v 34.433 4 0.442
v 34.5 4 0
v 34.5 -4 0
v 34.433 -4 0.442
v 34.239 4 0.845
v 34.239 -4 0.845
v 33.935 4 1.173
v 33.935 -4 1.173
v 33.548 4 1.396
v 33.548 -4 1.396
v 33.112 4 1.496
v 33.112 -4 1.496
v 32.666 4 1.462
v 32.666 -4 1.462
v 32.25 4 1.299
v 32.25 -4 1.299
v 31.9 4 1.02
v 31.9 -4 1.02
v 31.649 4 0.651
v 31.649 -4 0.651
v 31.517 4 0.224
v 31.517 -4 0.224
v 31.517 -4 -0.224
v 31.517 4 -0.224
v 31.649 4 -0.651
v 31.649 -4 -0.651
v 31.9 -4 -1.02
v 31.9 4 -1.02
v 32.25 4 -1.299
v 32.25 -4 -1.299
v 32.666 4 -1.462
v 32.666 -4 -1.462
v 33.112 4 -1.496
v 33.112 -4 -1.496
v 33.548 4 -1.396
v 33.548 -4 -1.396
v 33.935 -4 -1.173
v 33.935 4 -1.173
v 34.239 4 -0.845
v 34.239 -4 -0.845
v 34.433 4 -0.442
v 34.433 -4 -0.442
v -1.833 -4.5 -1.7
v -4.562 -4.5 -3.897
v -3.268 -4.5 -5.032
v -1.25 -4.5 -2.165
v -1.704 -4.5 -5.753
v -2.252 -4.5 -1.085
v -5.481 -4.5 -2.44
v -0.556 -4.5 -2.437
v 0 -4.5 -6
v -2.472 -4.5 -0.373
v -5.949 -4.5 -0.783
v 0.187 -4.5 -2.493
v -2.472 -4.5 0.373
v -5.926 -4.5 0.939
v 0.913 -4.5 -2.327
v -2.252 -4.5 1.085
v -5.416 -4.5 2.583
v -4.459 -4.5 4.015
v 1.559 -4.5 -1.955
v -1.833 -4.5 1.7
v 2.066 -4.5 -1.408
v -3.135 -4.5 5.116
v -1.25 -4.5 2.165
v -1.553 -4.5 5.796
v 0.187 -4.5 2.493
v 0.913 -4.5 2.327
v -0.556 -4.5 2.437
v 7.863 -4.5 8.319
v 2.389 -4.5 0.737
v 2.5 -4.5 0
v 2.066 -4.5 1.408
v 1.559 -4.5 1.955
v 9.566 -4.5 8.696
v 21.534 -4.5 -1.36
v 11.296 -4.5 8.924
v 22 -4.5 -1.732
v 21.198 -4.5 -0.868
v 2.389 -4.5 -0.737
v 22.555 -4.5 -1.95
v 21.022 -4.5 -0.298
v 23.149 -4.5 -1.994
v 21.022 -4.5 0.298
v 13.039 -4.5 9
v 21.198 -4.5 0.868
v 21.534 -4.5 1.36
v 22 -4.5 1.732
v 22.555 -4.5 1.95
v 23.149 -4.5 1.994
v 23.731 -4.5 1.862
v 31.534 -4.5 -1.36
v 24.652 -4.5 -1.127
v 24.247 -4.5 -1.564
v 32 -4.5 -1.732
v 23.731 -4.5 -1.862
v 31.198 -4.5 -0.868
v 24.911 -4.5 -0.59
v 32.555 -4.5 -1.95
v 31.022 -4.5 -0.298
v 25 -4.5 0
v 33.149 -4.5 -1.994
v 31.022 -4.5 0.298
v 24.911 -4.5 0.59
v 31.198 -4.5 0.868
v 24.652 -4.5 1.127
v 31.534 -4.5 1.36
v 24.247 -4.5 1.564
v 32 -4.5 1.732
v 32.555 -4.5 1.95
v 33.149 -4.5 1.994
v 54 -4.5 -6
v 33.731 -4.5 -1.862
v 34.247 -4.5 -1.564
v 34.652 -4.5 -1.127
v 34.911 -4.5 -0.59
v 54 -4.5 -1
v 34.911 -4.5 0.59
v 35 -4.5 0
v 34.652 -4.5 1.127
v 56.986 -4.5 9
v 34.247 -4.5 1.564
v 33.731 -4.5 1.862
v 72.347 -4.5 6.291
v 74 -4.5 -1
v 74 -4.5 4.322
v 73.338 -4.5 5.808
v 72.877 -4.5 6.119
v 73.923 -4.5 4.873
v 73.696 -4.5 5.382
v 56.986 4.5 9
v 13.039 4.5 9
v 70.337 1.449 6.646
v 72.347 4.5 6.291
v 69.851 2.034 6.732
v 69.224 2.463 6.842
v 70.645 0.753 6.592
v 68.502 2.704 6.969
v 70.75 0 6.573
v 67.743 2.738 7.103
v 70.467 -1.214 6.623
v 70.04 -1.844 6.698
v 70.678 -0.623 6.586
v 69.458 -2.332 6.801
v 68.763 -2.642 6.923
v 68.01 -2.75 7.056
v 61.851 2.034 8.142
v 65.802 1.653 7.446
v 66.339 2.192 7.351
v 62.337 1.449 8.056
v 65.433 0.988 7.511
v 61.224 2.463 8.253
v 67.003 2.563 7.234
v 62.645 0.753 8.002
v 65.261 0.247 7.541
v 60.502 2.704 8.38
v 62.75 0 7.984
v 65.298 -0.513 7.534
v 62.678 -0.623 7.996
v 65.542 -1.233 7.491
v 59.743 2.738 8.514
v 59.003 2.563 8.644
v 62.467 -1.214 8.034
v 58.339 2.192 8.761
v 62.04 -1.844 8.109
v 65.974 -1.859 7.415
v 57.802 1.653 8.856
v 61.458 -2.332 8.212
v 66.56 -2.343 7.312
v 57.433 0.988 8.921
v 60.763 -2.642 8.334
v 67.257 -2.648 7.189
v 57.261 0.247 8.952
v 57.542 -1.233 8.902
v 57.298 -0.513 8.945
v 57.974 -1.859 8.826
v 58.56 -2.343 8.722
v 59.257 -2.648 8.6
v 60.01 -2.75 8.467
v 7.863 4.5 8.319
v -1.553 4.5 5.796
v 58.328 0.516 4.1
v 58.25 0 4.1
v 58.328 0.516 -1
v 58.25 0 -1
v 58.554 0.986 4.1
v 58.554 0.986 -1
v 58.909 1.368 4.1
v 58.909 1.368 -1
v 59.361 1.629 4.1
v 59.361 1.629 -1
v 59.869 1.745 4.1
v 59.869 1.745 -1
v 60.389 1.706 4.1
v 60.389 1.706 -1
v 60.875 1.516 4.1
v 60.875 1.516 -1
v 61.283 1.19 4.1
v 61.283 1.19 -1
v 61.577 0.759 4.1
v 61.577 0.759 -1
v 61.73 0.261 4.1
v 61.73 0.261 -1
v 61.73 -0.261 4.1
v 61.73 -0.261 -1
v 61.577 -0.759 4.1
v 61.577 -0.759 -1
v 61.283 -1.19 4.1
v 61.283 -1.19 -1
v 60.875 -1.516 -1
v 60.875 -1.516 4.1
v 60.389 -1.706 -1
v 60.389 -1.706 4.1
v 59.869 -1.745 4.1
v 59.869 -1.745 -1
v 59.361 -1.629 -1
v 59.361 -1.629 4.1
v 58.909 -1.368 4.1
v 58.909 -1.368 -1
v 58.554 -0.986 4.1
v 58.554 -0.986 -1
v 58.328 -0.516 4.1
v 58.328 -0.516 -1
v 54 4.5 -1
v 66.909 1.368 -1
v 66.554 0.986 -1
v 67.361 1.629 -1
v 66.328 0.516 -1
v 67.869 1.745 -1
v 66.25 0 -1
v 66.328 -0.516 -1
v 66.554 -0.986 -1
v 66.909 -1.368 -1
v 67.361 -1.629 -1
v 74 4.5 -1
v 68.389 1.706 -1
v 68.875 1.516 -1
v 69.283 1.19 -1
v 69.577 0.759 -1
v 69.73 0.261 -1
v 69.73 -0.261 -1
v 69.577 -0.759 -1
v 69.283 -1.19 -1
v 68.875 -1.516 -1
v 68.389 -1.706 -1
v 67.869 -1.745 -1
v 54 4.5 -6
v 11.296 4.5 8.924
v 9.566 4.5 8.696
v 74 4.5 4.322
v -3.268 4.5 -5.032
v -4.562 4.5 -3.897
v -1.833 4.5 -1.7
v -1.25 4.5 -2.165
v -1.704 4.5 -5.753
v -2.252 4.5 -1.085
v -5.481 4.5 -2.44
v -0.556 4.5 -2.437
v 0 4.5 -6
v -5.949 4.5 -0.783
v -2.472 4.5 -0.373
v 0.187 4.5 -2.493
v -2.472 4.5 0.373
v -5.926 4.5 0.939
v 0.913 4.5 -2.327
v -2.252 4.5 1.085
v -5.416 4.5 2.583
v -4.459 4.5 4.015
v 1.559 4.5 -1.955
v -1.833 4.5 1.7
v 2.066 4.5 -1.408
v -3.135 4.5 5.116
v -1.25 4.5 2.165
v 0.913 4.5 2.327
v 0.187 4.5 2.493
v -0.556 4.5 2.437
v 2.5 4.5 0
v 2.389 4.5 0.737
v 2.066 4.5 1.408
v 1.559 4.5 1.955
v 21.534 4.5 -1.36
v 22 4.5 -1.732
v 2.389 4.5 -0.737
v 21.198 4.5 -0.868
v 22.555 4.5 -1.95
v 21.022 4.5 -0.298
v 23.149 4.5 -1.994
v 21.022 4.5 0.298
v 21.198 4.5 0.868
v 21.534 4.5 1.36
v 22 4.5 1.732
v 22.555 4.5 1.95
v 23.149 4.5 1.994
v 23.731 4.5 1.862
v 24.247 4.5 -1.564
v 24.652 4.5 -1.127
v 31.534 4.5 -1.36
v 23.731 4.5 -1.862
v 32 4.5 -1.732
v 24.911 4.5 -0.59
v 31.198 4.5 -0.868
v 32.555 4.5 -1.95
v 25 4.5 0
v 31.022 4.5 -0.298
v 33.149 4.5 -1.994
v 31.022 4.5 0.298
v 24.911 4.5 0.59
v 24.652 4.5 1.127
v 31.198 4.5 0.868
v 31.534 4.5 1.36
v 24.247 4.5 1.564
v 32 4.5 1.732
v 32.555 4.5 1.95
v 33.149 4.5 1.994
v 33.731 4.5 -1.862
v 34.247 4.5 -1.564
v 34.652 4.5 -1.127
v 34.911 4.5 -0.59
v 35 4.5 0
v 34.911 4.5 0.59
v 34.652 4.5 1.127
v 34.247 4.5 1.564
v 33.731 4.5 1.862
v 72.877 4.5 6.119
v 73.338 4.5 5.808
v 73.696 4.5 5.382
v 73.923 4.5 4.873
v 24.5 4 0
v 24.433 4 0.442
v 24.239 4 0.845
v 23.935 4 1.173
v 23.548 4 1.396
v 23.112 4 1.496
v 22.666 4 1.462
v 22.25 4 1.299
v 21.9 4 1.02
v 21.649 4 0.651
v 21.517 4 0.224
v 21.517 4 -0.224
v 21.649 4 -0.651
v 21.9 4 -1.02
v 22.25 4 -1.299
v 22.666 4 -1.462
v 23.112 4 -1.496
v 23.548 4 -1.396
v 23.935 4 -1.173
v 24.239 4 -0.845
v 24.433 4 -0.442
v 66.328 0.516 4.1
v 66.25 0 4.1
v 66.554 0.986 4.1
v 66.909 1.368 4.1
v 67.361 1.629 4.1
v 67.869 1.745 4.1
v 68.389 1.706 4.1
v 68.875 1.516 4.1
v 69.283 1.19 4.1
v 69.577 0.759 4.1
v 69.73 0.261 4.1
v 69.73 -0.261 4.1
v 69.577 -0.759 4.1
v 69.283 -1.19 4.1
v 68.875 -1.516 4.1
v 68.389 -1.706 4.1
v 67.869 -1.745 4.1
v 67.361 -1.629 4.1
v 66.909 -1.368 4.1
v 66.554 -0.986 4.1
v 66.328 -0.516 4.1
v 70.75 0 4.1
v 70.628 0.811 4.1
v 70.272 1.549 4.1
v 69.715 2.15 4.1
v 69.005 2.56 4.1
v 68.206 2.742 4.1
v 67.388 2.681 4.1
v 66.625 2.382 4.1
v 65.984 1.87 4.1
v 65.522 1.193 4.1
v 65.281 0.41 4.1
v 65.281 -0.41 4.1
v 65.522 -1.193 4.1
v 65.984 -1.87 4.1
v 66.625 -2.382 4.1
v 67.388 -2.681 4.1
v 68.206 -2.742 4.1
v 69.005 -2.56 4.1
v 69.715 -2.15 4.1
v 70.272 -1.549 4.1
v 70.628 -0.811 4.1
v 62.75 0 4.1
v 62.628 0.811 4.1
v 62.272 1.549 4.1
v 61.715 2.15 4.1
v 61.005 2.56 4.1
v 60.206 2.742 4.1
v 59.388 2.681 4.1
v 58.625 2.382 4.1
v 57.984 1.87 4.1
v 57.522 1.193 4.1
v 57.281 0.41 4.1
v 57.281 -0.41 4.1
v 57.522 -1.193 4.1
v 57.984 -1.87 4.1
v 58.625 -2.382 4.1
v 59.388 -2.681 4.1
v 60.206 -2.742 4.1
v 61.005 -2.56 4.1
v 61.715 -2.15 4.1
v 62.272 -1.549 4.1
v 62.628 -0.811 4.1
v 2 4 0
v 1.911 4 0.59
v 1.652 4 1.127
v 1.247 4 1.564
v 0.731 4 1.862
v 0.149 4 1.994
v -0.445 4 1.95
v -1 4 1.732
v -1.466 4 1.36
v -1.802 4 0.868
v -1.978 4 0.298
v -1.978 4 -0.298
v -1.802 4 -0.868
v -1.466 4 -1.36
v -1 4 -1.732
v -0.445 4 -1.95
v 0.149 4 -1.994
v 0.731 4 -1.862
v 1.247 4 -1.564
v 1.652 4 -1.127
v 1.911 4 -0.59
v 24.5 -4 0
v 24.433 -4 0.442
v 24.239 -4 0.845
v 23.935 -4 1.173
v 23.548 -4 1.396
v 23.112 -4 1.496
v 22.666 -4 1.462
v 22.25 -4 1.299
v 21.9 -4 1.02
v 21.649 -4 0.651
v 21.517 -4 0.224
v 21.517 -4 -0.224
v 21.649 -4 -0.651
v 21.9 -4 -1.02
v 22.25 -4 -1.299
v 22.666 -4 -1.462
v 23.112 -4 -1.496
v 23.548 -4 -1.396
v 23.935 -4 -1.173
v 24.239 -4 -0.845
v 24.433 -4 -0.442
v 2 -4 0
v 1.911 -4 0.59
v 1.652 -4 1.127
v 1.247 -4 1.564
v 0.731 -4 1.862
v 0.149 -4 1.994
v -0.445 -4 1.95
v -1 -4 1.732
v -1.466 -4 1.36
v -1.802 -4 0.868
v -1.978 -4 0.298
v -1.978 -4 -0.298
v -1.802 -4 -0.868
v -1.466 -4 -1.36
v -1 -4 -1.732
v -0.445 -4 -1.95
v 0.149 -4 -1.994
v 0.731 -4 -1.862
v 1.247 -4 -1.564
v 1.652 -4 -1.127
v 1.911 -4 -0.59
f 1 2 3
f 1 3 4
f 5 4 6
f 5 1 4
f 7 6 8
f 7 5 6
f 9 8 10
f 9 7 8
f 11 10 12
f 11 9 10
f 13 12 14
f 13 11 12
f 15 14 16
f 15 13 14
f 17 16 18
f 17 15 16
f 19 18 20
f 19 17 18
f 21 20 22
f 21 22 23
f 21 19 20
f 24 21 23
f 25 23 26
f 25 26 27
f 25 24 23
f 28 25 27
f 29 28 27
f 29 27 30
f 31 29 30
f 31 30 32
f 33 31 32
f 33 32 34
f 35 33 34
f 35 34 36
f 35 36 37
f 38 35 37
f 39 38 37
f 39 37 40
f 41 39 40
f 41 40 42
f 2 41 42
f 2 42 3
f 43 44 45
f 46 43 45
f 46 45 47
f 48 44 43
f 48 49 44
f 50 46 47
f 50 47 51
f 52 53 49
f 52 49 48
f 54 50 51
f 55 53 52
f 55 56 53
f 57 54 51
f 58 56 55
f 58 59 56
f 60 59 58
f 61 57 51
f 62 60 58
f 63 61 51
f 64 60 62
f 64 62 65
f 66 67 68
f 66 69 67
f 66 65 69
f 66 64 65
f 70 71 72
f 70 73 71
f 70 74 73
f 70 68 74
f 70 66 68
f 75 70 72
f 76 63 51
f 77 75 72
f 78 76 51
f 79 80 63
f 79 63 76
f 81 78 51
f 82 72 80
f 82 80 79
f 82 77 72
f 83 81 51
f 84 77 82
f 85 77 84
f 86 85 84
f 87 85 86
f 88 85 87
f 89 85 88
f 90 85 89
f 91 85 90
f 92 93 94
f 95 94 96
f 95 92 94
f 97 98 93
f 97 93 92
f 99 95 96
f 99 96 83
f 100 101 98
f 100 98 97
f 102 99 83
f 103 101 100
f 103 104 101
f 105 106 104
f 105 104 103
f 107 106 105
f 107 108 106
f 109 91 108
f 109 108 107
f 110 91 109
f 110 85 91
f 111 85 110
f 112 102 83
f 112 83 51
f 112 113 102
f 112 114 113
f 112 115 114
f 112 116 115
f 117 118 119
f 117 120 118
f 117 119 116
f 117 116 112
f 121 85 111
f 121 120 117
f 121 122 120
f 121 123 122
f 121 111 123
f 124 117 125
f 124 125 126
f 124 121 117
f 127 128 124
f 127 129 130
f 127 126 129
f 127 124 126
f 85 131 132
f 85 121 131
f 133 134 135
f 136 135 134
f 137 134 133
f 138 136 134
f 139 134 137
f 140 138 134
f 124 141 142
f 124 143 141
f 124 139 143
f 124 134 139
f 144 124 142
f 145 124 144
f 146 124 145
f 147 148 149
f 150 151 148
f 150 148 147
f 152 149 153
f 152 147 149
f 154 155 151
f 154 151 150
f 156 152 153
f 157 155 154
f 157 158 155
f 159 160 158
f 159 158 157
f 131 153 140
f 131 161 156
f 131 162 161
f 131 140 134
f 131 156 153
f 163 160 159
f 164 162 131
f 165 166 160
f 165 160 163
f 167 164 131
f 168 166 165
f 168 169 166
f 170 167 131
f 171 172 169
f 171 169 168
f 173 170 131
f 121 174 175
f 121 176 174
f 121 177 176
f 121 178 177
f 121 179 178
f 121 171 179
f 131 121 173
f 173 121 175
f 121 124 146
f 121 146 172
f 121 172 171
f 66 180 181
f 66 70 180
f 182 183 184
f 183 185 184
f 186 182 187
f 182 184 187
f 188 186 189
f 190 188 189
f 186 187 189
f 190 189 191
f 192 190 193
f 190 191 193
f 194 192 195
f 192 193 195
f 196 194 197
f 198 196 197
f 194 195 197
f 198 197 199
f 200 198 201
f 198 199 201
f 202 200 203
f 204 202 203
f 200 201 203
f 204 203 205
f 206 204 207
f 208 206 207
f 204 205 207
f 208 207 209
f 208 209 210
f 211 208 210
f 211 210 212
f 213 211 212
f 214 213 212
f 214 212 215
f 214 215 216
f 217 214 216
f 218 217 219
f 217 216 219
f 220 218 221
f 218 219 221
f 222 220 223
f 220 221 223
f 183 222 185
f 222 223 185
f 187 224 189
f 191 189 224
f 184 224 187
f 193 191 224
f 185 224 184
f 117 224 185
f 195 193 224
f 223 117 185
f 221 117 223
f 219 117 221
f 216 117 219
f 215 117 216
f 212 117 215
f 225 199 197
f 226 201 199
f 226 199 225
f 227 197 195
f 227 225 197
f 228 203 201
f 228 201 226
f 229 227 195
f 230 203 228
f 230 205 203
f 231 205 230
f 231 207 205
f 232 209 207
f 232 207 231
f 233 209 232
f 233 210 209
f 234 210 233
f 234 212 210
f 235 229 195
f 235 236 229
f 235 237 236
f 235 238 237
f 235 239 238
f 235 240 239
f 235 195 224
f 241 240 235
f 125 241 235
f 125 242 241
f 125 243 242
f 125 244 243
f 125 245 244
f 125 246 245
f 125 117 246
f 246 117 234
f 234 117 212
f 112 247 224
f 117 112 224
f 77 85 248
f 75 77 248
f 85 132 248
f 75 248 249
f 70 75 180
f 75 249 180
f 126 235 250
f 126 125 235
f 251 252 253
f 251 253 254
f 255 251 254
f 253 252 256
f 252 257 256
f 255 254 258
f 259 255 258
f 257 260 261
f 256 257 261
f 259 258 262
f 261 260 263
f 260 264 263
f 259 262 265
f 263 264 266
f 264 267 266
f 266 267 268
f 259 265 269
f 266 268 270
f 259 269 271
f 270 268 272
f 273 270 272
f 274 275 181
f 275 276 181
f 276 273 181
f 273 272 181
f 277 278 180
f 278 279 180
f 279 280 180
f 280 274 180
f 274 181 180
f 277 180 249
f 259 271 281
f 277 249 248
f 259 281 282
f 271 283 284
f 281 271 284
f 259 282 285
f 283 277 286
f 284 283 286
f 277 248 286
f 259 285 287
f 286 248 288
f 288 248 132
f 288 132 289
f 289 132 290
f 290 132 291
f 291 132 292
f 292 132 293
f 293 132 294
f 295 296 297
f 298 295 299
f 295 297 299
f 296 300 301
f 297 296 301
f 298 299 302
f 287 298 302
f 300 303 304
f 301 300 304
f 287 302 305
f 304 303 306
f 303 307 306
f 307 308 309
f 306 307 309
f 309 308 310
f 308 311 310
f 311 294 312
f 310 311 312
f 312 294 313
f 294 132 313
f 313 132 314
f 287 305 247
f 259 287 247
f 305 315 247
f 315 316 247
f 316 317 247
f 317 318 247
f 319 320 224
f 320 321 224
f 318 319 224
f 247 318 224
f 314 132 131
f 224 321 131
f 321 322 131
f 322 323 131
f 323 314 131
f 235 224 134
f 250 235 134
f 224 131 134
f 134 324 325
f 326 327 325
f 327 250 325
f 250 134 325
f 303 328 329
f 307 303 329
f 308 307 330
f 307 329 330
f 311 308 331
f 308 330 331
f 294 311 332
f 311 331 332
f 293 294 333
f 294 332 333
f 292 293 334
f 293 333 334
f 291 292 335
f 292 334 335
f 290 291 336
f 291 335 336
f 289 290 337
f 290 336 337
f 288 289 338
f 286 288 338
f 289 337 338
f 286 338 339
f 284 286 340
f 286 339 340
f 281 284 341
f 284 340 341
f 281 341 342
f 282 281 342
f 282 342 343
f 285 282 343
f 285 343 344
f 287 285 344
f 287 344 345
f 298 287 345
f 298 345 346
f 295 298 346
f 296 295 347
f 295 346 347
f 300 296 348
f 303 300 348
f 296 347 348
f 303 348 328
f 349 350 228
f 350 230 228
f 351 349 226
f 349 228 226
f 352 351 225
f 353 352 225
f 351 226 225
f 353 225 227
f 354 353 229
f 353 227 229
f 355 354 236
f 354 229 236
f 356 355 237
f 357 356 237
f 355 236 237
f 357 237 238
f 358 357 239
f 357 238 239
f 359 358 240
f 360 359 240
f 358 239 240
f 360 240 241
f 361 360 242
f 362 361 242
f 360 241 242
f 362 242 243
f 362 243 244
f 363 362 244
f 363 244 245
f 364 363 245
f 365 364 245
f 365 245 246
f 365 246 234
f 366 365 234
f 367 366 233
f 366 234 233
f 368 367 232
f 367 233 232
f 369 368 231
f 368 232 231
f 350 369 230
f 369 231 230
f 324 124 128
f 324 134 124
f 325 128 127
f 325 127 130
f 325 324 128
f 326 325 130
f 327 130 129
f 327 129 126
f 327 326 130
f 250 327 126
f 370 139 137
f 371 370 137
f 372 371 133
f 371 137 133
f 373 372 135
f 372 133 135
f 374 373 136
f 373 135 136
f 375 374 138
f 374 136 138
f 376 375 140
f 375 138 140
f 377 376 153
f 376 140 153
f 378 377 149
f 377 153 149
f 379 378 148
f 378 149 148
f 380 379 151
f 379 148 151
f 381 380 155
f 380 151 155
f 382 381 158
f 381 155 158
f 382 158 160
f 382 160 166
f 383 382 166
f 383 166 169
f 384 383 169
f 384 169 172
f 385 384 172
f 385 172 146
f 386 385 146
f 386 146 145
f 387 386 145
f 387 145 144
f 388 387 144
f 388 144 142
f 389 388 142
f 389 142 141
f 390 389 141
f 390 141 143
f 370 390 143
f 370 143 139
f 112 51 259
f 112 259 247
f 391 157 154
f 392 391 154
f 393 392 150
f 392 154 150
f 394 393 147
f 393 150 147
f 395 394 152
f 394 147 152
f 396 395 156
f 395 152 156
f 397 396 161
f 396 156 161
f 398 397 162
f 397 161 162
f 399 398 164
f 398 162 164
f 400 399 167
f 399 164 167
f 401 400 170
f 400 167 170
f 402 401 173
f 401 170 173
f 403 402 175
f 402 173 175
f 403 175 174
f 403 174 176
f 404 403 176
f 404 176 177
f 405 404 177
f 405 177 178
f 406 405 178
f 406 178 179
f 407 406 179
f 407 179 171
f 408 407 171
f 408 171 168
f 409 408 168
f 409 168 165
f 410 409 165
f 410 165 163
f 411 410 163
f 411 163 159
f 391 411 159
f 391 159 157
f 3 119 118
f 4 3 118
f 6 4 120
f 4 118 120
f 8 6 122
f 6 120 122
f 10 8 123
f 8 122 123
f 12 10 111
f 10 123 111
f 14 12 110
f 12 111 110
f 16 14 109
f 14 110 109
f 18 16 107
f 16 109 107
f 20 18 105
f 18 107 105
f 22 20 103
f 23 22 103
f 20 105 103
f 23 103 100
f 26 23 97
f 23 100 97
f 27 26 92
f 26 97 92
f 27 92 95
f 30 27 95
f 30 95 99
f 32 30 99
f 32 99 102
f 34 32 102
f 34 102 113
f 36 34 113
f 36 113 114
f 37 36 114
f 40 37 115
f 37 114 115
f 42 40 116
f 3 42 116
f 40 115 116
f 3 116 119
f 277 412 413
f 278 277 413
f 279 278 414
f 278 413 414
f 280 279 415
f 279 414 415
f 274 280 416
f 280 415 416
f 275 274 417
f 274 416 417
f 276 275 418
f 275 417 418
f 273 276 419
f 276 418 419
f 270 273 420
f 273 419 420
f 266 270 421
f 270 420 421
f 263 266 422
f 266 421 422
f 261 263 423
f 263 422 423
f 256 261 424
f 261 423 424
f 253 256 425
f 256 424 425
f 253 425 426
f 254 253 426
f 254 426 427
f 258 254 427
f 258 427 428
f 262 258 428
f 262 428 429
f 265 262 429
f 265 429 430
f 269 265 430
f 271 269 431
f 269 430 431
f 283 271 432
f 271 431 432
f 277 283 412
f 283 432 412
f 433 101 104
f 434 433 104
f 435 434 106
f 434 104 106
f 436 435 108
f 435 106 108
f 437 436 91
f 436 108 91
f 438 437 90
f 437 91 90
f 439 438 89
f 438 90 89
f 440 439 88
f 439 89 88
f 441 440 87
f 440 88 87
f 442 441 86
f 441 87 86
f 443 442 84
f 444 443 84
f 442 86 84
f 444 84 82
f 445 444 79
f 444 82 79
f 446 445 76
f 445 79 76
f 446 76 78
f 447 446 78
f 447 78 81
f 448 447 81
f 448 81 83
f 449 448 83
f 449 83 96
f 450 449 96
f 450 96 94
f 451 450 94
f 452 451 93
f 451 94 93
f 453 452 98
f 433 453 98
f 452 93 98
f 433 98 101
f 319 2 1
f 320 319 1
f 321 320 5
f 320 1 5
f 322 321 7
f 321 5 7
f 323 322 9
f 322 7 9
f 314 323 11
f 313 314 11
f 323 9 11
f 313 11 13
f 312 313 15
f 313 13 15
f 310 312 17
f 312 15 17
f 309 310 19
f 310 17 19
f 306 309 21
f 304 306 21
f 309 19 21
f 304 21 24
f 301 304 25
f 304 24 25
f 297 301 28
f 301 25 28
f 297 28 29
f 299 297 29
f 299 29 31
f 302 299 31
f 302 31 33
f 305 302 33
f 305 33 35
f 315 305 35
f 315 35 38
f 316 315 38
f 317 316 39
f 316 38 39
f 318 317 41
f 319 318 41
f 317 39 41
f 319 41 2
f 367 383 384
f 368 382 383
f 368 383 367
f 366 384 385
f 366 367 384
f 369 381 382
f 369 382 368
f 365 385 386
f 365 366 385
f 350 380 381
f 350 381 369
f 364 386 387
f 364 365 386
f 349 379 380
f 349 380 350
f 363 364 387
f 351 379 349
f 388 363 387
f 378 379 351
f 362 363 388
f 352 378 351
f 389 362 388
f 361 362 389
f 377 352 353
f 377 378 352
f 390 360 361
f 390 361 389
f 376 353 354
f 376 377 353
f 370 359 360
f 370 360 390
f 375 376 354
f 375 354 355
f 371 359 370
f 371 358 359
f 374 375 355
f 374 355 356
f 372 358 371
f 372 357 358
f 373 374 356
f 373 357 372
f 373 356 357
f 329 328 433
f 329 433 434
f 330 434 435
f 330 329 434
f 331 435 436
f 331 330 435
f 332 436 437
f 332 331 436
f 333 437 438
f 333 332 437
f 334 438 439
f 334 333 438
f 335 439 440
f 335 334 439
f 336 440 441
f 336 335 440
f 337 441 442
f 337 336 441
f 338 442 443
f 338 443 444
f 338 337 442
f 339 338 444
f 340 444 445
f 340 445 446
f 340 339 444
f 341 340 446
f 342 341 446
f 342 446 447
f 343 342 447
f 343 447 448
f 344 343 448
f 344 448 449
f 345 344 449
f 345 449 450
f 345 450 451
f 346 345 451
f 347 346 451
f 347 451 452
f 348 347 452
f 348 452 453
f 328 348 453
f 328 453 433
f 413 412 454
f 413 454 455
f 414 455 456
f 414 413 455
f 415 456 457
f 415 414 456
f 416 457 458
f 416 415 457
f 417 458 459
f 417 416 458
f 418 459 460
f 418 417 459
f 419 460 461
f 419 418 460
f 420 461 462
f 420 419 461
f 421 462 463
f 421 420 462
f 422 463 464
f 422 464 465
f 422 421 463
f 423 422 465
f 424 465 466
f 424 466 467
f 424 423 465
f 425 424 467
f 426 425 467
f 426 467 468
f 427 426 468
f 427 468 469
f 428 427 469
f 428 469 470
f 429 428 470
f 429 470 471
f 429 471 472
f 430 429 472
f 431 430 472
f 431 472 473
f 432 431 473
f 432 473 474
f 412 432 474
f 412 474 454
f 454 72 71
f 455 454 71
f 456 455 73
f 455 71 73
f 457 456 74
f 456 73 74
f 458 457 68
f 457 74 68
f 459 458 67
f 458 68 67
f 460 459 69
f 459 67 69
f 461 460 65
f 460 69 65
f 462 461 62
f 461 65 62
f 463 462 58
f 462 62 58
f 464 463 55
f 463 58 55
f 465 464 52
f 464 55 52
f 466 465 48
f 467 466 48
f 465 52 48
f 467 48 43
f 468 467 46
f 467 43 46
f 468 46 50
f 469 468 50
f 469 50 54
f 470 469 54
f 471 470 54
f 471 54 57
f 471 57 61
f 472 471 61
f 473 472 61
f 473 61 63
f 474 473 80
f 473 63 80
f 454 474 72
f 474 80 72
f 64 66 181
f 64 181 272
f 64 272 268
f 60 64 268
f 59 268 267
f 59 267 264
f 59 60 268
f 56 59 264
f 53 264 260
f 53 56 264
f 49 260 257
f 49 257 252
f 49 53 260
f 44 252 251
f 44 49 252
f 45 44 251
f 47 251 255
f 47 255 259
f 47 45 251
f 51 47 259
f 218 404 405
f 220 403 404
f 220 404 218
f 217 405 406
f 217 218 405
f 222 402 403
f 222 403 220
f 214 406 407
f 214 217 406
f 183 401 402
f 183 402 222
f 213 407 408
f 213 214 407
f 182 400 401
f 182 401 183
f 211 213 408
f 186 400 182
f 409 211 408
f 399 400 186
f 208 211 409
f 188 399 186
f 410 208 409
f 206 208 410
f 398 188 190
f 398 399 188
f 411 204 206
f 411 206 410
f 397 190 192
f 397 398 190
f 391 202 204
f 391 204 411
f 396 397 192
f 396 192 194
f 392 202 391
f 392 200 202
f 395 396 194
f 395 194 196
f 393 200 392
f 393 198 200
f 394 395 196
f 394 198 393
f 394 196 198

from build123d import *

# Parameters (mm, degrees)
F0_R           = 2
F0_R_2         = 1.5
F1_DEPTH       = 4.5
F2_R           = 2
F3_R           = 20
F4_SIZE        = 0.5
F6_D           = 3.5
F6_CBORE_D     = 5.5
F6_CBORE_DEPTH = 4.9


with BuildPart() as f1:
    # F0 (on Front) → F1 (new body, symmetric)
    with BuildSketch(Plane.XZ):
        with BuildLine():
            Line((10.406237, 9), (-1.552914, 5.795555))
            ThreePointArc((-1.552914, 5.795555), (-5.948669, -0.783157), (0, -6))
            Line((0, -6), (54, -6))
            Line((54, -6), (54, -1))
            Line((54, -1), (74, -1))
            Line((74, -1), (74, 6))
            Line((74, 6), (56.986155, 9))
            Line((56.986155, 9), (10.406237, 9))
        make_face()
        Circle(F0_R, mode=Mode.SUBTRACT)
        with Locations((23, 0)):
            Circle(F0_R_2, mode=Mode.SUBTRACT)
        with Locations((33, 0)):
            Circle(F0_R_2, mode=Mode.SUBTRACT)
    extrude(amount=F1_DEPTH, both=True)

    # F2
    f2_edges = [f1.edges().sort_by_distance(p)[0] for p in [
        (74, 0, 6),
    ]]
    fillet(f2_edges, radius=F2_R)

    # F3
    f3_edges = [f1.edges().sort_by_distance(p)[0] for p in [
        (10.406237, 0, 9),
    ]]
    fillet(f3_edges, radius=F3_R)

    # F4
    f4_edges = [f1.edges().sort_by_distance(p)[0] for p in [
        (-2, -4.5, 0),
        (21.5, -4.5, 0),
        (31.5, -4.5, 0),
        (-2, 4.5, 0),
        (21.5, 4.5, 0),
        (31.5, 4.5, 0),
    ]]
    chamfer(f4_edges, length=F4_SIZE)

    # F6 (through all)
    with Locations(Plane.XY.offset(9)):
        with Locations((60, 0), (68, 0)):
            CounterBoreHole(F6_D / 2, F6_CBORE_D / 2, F6_CBORE_DEPTH)


solid = f1.part
